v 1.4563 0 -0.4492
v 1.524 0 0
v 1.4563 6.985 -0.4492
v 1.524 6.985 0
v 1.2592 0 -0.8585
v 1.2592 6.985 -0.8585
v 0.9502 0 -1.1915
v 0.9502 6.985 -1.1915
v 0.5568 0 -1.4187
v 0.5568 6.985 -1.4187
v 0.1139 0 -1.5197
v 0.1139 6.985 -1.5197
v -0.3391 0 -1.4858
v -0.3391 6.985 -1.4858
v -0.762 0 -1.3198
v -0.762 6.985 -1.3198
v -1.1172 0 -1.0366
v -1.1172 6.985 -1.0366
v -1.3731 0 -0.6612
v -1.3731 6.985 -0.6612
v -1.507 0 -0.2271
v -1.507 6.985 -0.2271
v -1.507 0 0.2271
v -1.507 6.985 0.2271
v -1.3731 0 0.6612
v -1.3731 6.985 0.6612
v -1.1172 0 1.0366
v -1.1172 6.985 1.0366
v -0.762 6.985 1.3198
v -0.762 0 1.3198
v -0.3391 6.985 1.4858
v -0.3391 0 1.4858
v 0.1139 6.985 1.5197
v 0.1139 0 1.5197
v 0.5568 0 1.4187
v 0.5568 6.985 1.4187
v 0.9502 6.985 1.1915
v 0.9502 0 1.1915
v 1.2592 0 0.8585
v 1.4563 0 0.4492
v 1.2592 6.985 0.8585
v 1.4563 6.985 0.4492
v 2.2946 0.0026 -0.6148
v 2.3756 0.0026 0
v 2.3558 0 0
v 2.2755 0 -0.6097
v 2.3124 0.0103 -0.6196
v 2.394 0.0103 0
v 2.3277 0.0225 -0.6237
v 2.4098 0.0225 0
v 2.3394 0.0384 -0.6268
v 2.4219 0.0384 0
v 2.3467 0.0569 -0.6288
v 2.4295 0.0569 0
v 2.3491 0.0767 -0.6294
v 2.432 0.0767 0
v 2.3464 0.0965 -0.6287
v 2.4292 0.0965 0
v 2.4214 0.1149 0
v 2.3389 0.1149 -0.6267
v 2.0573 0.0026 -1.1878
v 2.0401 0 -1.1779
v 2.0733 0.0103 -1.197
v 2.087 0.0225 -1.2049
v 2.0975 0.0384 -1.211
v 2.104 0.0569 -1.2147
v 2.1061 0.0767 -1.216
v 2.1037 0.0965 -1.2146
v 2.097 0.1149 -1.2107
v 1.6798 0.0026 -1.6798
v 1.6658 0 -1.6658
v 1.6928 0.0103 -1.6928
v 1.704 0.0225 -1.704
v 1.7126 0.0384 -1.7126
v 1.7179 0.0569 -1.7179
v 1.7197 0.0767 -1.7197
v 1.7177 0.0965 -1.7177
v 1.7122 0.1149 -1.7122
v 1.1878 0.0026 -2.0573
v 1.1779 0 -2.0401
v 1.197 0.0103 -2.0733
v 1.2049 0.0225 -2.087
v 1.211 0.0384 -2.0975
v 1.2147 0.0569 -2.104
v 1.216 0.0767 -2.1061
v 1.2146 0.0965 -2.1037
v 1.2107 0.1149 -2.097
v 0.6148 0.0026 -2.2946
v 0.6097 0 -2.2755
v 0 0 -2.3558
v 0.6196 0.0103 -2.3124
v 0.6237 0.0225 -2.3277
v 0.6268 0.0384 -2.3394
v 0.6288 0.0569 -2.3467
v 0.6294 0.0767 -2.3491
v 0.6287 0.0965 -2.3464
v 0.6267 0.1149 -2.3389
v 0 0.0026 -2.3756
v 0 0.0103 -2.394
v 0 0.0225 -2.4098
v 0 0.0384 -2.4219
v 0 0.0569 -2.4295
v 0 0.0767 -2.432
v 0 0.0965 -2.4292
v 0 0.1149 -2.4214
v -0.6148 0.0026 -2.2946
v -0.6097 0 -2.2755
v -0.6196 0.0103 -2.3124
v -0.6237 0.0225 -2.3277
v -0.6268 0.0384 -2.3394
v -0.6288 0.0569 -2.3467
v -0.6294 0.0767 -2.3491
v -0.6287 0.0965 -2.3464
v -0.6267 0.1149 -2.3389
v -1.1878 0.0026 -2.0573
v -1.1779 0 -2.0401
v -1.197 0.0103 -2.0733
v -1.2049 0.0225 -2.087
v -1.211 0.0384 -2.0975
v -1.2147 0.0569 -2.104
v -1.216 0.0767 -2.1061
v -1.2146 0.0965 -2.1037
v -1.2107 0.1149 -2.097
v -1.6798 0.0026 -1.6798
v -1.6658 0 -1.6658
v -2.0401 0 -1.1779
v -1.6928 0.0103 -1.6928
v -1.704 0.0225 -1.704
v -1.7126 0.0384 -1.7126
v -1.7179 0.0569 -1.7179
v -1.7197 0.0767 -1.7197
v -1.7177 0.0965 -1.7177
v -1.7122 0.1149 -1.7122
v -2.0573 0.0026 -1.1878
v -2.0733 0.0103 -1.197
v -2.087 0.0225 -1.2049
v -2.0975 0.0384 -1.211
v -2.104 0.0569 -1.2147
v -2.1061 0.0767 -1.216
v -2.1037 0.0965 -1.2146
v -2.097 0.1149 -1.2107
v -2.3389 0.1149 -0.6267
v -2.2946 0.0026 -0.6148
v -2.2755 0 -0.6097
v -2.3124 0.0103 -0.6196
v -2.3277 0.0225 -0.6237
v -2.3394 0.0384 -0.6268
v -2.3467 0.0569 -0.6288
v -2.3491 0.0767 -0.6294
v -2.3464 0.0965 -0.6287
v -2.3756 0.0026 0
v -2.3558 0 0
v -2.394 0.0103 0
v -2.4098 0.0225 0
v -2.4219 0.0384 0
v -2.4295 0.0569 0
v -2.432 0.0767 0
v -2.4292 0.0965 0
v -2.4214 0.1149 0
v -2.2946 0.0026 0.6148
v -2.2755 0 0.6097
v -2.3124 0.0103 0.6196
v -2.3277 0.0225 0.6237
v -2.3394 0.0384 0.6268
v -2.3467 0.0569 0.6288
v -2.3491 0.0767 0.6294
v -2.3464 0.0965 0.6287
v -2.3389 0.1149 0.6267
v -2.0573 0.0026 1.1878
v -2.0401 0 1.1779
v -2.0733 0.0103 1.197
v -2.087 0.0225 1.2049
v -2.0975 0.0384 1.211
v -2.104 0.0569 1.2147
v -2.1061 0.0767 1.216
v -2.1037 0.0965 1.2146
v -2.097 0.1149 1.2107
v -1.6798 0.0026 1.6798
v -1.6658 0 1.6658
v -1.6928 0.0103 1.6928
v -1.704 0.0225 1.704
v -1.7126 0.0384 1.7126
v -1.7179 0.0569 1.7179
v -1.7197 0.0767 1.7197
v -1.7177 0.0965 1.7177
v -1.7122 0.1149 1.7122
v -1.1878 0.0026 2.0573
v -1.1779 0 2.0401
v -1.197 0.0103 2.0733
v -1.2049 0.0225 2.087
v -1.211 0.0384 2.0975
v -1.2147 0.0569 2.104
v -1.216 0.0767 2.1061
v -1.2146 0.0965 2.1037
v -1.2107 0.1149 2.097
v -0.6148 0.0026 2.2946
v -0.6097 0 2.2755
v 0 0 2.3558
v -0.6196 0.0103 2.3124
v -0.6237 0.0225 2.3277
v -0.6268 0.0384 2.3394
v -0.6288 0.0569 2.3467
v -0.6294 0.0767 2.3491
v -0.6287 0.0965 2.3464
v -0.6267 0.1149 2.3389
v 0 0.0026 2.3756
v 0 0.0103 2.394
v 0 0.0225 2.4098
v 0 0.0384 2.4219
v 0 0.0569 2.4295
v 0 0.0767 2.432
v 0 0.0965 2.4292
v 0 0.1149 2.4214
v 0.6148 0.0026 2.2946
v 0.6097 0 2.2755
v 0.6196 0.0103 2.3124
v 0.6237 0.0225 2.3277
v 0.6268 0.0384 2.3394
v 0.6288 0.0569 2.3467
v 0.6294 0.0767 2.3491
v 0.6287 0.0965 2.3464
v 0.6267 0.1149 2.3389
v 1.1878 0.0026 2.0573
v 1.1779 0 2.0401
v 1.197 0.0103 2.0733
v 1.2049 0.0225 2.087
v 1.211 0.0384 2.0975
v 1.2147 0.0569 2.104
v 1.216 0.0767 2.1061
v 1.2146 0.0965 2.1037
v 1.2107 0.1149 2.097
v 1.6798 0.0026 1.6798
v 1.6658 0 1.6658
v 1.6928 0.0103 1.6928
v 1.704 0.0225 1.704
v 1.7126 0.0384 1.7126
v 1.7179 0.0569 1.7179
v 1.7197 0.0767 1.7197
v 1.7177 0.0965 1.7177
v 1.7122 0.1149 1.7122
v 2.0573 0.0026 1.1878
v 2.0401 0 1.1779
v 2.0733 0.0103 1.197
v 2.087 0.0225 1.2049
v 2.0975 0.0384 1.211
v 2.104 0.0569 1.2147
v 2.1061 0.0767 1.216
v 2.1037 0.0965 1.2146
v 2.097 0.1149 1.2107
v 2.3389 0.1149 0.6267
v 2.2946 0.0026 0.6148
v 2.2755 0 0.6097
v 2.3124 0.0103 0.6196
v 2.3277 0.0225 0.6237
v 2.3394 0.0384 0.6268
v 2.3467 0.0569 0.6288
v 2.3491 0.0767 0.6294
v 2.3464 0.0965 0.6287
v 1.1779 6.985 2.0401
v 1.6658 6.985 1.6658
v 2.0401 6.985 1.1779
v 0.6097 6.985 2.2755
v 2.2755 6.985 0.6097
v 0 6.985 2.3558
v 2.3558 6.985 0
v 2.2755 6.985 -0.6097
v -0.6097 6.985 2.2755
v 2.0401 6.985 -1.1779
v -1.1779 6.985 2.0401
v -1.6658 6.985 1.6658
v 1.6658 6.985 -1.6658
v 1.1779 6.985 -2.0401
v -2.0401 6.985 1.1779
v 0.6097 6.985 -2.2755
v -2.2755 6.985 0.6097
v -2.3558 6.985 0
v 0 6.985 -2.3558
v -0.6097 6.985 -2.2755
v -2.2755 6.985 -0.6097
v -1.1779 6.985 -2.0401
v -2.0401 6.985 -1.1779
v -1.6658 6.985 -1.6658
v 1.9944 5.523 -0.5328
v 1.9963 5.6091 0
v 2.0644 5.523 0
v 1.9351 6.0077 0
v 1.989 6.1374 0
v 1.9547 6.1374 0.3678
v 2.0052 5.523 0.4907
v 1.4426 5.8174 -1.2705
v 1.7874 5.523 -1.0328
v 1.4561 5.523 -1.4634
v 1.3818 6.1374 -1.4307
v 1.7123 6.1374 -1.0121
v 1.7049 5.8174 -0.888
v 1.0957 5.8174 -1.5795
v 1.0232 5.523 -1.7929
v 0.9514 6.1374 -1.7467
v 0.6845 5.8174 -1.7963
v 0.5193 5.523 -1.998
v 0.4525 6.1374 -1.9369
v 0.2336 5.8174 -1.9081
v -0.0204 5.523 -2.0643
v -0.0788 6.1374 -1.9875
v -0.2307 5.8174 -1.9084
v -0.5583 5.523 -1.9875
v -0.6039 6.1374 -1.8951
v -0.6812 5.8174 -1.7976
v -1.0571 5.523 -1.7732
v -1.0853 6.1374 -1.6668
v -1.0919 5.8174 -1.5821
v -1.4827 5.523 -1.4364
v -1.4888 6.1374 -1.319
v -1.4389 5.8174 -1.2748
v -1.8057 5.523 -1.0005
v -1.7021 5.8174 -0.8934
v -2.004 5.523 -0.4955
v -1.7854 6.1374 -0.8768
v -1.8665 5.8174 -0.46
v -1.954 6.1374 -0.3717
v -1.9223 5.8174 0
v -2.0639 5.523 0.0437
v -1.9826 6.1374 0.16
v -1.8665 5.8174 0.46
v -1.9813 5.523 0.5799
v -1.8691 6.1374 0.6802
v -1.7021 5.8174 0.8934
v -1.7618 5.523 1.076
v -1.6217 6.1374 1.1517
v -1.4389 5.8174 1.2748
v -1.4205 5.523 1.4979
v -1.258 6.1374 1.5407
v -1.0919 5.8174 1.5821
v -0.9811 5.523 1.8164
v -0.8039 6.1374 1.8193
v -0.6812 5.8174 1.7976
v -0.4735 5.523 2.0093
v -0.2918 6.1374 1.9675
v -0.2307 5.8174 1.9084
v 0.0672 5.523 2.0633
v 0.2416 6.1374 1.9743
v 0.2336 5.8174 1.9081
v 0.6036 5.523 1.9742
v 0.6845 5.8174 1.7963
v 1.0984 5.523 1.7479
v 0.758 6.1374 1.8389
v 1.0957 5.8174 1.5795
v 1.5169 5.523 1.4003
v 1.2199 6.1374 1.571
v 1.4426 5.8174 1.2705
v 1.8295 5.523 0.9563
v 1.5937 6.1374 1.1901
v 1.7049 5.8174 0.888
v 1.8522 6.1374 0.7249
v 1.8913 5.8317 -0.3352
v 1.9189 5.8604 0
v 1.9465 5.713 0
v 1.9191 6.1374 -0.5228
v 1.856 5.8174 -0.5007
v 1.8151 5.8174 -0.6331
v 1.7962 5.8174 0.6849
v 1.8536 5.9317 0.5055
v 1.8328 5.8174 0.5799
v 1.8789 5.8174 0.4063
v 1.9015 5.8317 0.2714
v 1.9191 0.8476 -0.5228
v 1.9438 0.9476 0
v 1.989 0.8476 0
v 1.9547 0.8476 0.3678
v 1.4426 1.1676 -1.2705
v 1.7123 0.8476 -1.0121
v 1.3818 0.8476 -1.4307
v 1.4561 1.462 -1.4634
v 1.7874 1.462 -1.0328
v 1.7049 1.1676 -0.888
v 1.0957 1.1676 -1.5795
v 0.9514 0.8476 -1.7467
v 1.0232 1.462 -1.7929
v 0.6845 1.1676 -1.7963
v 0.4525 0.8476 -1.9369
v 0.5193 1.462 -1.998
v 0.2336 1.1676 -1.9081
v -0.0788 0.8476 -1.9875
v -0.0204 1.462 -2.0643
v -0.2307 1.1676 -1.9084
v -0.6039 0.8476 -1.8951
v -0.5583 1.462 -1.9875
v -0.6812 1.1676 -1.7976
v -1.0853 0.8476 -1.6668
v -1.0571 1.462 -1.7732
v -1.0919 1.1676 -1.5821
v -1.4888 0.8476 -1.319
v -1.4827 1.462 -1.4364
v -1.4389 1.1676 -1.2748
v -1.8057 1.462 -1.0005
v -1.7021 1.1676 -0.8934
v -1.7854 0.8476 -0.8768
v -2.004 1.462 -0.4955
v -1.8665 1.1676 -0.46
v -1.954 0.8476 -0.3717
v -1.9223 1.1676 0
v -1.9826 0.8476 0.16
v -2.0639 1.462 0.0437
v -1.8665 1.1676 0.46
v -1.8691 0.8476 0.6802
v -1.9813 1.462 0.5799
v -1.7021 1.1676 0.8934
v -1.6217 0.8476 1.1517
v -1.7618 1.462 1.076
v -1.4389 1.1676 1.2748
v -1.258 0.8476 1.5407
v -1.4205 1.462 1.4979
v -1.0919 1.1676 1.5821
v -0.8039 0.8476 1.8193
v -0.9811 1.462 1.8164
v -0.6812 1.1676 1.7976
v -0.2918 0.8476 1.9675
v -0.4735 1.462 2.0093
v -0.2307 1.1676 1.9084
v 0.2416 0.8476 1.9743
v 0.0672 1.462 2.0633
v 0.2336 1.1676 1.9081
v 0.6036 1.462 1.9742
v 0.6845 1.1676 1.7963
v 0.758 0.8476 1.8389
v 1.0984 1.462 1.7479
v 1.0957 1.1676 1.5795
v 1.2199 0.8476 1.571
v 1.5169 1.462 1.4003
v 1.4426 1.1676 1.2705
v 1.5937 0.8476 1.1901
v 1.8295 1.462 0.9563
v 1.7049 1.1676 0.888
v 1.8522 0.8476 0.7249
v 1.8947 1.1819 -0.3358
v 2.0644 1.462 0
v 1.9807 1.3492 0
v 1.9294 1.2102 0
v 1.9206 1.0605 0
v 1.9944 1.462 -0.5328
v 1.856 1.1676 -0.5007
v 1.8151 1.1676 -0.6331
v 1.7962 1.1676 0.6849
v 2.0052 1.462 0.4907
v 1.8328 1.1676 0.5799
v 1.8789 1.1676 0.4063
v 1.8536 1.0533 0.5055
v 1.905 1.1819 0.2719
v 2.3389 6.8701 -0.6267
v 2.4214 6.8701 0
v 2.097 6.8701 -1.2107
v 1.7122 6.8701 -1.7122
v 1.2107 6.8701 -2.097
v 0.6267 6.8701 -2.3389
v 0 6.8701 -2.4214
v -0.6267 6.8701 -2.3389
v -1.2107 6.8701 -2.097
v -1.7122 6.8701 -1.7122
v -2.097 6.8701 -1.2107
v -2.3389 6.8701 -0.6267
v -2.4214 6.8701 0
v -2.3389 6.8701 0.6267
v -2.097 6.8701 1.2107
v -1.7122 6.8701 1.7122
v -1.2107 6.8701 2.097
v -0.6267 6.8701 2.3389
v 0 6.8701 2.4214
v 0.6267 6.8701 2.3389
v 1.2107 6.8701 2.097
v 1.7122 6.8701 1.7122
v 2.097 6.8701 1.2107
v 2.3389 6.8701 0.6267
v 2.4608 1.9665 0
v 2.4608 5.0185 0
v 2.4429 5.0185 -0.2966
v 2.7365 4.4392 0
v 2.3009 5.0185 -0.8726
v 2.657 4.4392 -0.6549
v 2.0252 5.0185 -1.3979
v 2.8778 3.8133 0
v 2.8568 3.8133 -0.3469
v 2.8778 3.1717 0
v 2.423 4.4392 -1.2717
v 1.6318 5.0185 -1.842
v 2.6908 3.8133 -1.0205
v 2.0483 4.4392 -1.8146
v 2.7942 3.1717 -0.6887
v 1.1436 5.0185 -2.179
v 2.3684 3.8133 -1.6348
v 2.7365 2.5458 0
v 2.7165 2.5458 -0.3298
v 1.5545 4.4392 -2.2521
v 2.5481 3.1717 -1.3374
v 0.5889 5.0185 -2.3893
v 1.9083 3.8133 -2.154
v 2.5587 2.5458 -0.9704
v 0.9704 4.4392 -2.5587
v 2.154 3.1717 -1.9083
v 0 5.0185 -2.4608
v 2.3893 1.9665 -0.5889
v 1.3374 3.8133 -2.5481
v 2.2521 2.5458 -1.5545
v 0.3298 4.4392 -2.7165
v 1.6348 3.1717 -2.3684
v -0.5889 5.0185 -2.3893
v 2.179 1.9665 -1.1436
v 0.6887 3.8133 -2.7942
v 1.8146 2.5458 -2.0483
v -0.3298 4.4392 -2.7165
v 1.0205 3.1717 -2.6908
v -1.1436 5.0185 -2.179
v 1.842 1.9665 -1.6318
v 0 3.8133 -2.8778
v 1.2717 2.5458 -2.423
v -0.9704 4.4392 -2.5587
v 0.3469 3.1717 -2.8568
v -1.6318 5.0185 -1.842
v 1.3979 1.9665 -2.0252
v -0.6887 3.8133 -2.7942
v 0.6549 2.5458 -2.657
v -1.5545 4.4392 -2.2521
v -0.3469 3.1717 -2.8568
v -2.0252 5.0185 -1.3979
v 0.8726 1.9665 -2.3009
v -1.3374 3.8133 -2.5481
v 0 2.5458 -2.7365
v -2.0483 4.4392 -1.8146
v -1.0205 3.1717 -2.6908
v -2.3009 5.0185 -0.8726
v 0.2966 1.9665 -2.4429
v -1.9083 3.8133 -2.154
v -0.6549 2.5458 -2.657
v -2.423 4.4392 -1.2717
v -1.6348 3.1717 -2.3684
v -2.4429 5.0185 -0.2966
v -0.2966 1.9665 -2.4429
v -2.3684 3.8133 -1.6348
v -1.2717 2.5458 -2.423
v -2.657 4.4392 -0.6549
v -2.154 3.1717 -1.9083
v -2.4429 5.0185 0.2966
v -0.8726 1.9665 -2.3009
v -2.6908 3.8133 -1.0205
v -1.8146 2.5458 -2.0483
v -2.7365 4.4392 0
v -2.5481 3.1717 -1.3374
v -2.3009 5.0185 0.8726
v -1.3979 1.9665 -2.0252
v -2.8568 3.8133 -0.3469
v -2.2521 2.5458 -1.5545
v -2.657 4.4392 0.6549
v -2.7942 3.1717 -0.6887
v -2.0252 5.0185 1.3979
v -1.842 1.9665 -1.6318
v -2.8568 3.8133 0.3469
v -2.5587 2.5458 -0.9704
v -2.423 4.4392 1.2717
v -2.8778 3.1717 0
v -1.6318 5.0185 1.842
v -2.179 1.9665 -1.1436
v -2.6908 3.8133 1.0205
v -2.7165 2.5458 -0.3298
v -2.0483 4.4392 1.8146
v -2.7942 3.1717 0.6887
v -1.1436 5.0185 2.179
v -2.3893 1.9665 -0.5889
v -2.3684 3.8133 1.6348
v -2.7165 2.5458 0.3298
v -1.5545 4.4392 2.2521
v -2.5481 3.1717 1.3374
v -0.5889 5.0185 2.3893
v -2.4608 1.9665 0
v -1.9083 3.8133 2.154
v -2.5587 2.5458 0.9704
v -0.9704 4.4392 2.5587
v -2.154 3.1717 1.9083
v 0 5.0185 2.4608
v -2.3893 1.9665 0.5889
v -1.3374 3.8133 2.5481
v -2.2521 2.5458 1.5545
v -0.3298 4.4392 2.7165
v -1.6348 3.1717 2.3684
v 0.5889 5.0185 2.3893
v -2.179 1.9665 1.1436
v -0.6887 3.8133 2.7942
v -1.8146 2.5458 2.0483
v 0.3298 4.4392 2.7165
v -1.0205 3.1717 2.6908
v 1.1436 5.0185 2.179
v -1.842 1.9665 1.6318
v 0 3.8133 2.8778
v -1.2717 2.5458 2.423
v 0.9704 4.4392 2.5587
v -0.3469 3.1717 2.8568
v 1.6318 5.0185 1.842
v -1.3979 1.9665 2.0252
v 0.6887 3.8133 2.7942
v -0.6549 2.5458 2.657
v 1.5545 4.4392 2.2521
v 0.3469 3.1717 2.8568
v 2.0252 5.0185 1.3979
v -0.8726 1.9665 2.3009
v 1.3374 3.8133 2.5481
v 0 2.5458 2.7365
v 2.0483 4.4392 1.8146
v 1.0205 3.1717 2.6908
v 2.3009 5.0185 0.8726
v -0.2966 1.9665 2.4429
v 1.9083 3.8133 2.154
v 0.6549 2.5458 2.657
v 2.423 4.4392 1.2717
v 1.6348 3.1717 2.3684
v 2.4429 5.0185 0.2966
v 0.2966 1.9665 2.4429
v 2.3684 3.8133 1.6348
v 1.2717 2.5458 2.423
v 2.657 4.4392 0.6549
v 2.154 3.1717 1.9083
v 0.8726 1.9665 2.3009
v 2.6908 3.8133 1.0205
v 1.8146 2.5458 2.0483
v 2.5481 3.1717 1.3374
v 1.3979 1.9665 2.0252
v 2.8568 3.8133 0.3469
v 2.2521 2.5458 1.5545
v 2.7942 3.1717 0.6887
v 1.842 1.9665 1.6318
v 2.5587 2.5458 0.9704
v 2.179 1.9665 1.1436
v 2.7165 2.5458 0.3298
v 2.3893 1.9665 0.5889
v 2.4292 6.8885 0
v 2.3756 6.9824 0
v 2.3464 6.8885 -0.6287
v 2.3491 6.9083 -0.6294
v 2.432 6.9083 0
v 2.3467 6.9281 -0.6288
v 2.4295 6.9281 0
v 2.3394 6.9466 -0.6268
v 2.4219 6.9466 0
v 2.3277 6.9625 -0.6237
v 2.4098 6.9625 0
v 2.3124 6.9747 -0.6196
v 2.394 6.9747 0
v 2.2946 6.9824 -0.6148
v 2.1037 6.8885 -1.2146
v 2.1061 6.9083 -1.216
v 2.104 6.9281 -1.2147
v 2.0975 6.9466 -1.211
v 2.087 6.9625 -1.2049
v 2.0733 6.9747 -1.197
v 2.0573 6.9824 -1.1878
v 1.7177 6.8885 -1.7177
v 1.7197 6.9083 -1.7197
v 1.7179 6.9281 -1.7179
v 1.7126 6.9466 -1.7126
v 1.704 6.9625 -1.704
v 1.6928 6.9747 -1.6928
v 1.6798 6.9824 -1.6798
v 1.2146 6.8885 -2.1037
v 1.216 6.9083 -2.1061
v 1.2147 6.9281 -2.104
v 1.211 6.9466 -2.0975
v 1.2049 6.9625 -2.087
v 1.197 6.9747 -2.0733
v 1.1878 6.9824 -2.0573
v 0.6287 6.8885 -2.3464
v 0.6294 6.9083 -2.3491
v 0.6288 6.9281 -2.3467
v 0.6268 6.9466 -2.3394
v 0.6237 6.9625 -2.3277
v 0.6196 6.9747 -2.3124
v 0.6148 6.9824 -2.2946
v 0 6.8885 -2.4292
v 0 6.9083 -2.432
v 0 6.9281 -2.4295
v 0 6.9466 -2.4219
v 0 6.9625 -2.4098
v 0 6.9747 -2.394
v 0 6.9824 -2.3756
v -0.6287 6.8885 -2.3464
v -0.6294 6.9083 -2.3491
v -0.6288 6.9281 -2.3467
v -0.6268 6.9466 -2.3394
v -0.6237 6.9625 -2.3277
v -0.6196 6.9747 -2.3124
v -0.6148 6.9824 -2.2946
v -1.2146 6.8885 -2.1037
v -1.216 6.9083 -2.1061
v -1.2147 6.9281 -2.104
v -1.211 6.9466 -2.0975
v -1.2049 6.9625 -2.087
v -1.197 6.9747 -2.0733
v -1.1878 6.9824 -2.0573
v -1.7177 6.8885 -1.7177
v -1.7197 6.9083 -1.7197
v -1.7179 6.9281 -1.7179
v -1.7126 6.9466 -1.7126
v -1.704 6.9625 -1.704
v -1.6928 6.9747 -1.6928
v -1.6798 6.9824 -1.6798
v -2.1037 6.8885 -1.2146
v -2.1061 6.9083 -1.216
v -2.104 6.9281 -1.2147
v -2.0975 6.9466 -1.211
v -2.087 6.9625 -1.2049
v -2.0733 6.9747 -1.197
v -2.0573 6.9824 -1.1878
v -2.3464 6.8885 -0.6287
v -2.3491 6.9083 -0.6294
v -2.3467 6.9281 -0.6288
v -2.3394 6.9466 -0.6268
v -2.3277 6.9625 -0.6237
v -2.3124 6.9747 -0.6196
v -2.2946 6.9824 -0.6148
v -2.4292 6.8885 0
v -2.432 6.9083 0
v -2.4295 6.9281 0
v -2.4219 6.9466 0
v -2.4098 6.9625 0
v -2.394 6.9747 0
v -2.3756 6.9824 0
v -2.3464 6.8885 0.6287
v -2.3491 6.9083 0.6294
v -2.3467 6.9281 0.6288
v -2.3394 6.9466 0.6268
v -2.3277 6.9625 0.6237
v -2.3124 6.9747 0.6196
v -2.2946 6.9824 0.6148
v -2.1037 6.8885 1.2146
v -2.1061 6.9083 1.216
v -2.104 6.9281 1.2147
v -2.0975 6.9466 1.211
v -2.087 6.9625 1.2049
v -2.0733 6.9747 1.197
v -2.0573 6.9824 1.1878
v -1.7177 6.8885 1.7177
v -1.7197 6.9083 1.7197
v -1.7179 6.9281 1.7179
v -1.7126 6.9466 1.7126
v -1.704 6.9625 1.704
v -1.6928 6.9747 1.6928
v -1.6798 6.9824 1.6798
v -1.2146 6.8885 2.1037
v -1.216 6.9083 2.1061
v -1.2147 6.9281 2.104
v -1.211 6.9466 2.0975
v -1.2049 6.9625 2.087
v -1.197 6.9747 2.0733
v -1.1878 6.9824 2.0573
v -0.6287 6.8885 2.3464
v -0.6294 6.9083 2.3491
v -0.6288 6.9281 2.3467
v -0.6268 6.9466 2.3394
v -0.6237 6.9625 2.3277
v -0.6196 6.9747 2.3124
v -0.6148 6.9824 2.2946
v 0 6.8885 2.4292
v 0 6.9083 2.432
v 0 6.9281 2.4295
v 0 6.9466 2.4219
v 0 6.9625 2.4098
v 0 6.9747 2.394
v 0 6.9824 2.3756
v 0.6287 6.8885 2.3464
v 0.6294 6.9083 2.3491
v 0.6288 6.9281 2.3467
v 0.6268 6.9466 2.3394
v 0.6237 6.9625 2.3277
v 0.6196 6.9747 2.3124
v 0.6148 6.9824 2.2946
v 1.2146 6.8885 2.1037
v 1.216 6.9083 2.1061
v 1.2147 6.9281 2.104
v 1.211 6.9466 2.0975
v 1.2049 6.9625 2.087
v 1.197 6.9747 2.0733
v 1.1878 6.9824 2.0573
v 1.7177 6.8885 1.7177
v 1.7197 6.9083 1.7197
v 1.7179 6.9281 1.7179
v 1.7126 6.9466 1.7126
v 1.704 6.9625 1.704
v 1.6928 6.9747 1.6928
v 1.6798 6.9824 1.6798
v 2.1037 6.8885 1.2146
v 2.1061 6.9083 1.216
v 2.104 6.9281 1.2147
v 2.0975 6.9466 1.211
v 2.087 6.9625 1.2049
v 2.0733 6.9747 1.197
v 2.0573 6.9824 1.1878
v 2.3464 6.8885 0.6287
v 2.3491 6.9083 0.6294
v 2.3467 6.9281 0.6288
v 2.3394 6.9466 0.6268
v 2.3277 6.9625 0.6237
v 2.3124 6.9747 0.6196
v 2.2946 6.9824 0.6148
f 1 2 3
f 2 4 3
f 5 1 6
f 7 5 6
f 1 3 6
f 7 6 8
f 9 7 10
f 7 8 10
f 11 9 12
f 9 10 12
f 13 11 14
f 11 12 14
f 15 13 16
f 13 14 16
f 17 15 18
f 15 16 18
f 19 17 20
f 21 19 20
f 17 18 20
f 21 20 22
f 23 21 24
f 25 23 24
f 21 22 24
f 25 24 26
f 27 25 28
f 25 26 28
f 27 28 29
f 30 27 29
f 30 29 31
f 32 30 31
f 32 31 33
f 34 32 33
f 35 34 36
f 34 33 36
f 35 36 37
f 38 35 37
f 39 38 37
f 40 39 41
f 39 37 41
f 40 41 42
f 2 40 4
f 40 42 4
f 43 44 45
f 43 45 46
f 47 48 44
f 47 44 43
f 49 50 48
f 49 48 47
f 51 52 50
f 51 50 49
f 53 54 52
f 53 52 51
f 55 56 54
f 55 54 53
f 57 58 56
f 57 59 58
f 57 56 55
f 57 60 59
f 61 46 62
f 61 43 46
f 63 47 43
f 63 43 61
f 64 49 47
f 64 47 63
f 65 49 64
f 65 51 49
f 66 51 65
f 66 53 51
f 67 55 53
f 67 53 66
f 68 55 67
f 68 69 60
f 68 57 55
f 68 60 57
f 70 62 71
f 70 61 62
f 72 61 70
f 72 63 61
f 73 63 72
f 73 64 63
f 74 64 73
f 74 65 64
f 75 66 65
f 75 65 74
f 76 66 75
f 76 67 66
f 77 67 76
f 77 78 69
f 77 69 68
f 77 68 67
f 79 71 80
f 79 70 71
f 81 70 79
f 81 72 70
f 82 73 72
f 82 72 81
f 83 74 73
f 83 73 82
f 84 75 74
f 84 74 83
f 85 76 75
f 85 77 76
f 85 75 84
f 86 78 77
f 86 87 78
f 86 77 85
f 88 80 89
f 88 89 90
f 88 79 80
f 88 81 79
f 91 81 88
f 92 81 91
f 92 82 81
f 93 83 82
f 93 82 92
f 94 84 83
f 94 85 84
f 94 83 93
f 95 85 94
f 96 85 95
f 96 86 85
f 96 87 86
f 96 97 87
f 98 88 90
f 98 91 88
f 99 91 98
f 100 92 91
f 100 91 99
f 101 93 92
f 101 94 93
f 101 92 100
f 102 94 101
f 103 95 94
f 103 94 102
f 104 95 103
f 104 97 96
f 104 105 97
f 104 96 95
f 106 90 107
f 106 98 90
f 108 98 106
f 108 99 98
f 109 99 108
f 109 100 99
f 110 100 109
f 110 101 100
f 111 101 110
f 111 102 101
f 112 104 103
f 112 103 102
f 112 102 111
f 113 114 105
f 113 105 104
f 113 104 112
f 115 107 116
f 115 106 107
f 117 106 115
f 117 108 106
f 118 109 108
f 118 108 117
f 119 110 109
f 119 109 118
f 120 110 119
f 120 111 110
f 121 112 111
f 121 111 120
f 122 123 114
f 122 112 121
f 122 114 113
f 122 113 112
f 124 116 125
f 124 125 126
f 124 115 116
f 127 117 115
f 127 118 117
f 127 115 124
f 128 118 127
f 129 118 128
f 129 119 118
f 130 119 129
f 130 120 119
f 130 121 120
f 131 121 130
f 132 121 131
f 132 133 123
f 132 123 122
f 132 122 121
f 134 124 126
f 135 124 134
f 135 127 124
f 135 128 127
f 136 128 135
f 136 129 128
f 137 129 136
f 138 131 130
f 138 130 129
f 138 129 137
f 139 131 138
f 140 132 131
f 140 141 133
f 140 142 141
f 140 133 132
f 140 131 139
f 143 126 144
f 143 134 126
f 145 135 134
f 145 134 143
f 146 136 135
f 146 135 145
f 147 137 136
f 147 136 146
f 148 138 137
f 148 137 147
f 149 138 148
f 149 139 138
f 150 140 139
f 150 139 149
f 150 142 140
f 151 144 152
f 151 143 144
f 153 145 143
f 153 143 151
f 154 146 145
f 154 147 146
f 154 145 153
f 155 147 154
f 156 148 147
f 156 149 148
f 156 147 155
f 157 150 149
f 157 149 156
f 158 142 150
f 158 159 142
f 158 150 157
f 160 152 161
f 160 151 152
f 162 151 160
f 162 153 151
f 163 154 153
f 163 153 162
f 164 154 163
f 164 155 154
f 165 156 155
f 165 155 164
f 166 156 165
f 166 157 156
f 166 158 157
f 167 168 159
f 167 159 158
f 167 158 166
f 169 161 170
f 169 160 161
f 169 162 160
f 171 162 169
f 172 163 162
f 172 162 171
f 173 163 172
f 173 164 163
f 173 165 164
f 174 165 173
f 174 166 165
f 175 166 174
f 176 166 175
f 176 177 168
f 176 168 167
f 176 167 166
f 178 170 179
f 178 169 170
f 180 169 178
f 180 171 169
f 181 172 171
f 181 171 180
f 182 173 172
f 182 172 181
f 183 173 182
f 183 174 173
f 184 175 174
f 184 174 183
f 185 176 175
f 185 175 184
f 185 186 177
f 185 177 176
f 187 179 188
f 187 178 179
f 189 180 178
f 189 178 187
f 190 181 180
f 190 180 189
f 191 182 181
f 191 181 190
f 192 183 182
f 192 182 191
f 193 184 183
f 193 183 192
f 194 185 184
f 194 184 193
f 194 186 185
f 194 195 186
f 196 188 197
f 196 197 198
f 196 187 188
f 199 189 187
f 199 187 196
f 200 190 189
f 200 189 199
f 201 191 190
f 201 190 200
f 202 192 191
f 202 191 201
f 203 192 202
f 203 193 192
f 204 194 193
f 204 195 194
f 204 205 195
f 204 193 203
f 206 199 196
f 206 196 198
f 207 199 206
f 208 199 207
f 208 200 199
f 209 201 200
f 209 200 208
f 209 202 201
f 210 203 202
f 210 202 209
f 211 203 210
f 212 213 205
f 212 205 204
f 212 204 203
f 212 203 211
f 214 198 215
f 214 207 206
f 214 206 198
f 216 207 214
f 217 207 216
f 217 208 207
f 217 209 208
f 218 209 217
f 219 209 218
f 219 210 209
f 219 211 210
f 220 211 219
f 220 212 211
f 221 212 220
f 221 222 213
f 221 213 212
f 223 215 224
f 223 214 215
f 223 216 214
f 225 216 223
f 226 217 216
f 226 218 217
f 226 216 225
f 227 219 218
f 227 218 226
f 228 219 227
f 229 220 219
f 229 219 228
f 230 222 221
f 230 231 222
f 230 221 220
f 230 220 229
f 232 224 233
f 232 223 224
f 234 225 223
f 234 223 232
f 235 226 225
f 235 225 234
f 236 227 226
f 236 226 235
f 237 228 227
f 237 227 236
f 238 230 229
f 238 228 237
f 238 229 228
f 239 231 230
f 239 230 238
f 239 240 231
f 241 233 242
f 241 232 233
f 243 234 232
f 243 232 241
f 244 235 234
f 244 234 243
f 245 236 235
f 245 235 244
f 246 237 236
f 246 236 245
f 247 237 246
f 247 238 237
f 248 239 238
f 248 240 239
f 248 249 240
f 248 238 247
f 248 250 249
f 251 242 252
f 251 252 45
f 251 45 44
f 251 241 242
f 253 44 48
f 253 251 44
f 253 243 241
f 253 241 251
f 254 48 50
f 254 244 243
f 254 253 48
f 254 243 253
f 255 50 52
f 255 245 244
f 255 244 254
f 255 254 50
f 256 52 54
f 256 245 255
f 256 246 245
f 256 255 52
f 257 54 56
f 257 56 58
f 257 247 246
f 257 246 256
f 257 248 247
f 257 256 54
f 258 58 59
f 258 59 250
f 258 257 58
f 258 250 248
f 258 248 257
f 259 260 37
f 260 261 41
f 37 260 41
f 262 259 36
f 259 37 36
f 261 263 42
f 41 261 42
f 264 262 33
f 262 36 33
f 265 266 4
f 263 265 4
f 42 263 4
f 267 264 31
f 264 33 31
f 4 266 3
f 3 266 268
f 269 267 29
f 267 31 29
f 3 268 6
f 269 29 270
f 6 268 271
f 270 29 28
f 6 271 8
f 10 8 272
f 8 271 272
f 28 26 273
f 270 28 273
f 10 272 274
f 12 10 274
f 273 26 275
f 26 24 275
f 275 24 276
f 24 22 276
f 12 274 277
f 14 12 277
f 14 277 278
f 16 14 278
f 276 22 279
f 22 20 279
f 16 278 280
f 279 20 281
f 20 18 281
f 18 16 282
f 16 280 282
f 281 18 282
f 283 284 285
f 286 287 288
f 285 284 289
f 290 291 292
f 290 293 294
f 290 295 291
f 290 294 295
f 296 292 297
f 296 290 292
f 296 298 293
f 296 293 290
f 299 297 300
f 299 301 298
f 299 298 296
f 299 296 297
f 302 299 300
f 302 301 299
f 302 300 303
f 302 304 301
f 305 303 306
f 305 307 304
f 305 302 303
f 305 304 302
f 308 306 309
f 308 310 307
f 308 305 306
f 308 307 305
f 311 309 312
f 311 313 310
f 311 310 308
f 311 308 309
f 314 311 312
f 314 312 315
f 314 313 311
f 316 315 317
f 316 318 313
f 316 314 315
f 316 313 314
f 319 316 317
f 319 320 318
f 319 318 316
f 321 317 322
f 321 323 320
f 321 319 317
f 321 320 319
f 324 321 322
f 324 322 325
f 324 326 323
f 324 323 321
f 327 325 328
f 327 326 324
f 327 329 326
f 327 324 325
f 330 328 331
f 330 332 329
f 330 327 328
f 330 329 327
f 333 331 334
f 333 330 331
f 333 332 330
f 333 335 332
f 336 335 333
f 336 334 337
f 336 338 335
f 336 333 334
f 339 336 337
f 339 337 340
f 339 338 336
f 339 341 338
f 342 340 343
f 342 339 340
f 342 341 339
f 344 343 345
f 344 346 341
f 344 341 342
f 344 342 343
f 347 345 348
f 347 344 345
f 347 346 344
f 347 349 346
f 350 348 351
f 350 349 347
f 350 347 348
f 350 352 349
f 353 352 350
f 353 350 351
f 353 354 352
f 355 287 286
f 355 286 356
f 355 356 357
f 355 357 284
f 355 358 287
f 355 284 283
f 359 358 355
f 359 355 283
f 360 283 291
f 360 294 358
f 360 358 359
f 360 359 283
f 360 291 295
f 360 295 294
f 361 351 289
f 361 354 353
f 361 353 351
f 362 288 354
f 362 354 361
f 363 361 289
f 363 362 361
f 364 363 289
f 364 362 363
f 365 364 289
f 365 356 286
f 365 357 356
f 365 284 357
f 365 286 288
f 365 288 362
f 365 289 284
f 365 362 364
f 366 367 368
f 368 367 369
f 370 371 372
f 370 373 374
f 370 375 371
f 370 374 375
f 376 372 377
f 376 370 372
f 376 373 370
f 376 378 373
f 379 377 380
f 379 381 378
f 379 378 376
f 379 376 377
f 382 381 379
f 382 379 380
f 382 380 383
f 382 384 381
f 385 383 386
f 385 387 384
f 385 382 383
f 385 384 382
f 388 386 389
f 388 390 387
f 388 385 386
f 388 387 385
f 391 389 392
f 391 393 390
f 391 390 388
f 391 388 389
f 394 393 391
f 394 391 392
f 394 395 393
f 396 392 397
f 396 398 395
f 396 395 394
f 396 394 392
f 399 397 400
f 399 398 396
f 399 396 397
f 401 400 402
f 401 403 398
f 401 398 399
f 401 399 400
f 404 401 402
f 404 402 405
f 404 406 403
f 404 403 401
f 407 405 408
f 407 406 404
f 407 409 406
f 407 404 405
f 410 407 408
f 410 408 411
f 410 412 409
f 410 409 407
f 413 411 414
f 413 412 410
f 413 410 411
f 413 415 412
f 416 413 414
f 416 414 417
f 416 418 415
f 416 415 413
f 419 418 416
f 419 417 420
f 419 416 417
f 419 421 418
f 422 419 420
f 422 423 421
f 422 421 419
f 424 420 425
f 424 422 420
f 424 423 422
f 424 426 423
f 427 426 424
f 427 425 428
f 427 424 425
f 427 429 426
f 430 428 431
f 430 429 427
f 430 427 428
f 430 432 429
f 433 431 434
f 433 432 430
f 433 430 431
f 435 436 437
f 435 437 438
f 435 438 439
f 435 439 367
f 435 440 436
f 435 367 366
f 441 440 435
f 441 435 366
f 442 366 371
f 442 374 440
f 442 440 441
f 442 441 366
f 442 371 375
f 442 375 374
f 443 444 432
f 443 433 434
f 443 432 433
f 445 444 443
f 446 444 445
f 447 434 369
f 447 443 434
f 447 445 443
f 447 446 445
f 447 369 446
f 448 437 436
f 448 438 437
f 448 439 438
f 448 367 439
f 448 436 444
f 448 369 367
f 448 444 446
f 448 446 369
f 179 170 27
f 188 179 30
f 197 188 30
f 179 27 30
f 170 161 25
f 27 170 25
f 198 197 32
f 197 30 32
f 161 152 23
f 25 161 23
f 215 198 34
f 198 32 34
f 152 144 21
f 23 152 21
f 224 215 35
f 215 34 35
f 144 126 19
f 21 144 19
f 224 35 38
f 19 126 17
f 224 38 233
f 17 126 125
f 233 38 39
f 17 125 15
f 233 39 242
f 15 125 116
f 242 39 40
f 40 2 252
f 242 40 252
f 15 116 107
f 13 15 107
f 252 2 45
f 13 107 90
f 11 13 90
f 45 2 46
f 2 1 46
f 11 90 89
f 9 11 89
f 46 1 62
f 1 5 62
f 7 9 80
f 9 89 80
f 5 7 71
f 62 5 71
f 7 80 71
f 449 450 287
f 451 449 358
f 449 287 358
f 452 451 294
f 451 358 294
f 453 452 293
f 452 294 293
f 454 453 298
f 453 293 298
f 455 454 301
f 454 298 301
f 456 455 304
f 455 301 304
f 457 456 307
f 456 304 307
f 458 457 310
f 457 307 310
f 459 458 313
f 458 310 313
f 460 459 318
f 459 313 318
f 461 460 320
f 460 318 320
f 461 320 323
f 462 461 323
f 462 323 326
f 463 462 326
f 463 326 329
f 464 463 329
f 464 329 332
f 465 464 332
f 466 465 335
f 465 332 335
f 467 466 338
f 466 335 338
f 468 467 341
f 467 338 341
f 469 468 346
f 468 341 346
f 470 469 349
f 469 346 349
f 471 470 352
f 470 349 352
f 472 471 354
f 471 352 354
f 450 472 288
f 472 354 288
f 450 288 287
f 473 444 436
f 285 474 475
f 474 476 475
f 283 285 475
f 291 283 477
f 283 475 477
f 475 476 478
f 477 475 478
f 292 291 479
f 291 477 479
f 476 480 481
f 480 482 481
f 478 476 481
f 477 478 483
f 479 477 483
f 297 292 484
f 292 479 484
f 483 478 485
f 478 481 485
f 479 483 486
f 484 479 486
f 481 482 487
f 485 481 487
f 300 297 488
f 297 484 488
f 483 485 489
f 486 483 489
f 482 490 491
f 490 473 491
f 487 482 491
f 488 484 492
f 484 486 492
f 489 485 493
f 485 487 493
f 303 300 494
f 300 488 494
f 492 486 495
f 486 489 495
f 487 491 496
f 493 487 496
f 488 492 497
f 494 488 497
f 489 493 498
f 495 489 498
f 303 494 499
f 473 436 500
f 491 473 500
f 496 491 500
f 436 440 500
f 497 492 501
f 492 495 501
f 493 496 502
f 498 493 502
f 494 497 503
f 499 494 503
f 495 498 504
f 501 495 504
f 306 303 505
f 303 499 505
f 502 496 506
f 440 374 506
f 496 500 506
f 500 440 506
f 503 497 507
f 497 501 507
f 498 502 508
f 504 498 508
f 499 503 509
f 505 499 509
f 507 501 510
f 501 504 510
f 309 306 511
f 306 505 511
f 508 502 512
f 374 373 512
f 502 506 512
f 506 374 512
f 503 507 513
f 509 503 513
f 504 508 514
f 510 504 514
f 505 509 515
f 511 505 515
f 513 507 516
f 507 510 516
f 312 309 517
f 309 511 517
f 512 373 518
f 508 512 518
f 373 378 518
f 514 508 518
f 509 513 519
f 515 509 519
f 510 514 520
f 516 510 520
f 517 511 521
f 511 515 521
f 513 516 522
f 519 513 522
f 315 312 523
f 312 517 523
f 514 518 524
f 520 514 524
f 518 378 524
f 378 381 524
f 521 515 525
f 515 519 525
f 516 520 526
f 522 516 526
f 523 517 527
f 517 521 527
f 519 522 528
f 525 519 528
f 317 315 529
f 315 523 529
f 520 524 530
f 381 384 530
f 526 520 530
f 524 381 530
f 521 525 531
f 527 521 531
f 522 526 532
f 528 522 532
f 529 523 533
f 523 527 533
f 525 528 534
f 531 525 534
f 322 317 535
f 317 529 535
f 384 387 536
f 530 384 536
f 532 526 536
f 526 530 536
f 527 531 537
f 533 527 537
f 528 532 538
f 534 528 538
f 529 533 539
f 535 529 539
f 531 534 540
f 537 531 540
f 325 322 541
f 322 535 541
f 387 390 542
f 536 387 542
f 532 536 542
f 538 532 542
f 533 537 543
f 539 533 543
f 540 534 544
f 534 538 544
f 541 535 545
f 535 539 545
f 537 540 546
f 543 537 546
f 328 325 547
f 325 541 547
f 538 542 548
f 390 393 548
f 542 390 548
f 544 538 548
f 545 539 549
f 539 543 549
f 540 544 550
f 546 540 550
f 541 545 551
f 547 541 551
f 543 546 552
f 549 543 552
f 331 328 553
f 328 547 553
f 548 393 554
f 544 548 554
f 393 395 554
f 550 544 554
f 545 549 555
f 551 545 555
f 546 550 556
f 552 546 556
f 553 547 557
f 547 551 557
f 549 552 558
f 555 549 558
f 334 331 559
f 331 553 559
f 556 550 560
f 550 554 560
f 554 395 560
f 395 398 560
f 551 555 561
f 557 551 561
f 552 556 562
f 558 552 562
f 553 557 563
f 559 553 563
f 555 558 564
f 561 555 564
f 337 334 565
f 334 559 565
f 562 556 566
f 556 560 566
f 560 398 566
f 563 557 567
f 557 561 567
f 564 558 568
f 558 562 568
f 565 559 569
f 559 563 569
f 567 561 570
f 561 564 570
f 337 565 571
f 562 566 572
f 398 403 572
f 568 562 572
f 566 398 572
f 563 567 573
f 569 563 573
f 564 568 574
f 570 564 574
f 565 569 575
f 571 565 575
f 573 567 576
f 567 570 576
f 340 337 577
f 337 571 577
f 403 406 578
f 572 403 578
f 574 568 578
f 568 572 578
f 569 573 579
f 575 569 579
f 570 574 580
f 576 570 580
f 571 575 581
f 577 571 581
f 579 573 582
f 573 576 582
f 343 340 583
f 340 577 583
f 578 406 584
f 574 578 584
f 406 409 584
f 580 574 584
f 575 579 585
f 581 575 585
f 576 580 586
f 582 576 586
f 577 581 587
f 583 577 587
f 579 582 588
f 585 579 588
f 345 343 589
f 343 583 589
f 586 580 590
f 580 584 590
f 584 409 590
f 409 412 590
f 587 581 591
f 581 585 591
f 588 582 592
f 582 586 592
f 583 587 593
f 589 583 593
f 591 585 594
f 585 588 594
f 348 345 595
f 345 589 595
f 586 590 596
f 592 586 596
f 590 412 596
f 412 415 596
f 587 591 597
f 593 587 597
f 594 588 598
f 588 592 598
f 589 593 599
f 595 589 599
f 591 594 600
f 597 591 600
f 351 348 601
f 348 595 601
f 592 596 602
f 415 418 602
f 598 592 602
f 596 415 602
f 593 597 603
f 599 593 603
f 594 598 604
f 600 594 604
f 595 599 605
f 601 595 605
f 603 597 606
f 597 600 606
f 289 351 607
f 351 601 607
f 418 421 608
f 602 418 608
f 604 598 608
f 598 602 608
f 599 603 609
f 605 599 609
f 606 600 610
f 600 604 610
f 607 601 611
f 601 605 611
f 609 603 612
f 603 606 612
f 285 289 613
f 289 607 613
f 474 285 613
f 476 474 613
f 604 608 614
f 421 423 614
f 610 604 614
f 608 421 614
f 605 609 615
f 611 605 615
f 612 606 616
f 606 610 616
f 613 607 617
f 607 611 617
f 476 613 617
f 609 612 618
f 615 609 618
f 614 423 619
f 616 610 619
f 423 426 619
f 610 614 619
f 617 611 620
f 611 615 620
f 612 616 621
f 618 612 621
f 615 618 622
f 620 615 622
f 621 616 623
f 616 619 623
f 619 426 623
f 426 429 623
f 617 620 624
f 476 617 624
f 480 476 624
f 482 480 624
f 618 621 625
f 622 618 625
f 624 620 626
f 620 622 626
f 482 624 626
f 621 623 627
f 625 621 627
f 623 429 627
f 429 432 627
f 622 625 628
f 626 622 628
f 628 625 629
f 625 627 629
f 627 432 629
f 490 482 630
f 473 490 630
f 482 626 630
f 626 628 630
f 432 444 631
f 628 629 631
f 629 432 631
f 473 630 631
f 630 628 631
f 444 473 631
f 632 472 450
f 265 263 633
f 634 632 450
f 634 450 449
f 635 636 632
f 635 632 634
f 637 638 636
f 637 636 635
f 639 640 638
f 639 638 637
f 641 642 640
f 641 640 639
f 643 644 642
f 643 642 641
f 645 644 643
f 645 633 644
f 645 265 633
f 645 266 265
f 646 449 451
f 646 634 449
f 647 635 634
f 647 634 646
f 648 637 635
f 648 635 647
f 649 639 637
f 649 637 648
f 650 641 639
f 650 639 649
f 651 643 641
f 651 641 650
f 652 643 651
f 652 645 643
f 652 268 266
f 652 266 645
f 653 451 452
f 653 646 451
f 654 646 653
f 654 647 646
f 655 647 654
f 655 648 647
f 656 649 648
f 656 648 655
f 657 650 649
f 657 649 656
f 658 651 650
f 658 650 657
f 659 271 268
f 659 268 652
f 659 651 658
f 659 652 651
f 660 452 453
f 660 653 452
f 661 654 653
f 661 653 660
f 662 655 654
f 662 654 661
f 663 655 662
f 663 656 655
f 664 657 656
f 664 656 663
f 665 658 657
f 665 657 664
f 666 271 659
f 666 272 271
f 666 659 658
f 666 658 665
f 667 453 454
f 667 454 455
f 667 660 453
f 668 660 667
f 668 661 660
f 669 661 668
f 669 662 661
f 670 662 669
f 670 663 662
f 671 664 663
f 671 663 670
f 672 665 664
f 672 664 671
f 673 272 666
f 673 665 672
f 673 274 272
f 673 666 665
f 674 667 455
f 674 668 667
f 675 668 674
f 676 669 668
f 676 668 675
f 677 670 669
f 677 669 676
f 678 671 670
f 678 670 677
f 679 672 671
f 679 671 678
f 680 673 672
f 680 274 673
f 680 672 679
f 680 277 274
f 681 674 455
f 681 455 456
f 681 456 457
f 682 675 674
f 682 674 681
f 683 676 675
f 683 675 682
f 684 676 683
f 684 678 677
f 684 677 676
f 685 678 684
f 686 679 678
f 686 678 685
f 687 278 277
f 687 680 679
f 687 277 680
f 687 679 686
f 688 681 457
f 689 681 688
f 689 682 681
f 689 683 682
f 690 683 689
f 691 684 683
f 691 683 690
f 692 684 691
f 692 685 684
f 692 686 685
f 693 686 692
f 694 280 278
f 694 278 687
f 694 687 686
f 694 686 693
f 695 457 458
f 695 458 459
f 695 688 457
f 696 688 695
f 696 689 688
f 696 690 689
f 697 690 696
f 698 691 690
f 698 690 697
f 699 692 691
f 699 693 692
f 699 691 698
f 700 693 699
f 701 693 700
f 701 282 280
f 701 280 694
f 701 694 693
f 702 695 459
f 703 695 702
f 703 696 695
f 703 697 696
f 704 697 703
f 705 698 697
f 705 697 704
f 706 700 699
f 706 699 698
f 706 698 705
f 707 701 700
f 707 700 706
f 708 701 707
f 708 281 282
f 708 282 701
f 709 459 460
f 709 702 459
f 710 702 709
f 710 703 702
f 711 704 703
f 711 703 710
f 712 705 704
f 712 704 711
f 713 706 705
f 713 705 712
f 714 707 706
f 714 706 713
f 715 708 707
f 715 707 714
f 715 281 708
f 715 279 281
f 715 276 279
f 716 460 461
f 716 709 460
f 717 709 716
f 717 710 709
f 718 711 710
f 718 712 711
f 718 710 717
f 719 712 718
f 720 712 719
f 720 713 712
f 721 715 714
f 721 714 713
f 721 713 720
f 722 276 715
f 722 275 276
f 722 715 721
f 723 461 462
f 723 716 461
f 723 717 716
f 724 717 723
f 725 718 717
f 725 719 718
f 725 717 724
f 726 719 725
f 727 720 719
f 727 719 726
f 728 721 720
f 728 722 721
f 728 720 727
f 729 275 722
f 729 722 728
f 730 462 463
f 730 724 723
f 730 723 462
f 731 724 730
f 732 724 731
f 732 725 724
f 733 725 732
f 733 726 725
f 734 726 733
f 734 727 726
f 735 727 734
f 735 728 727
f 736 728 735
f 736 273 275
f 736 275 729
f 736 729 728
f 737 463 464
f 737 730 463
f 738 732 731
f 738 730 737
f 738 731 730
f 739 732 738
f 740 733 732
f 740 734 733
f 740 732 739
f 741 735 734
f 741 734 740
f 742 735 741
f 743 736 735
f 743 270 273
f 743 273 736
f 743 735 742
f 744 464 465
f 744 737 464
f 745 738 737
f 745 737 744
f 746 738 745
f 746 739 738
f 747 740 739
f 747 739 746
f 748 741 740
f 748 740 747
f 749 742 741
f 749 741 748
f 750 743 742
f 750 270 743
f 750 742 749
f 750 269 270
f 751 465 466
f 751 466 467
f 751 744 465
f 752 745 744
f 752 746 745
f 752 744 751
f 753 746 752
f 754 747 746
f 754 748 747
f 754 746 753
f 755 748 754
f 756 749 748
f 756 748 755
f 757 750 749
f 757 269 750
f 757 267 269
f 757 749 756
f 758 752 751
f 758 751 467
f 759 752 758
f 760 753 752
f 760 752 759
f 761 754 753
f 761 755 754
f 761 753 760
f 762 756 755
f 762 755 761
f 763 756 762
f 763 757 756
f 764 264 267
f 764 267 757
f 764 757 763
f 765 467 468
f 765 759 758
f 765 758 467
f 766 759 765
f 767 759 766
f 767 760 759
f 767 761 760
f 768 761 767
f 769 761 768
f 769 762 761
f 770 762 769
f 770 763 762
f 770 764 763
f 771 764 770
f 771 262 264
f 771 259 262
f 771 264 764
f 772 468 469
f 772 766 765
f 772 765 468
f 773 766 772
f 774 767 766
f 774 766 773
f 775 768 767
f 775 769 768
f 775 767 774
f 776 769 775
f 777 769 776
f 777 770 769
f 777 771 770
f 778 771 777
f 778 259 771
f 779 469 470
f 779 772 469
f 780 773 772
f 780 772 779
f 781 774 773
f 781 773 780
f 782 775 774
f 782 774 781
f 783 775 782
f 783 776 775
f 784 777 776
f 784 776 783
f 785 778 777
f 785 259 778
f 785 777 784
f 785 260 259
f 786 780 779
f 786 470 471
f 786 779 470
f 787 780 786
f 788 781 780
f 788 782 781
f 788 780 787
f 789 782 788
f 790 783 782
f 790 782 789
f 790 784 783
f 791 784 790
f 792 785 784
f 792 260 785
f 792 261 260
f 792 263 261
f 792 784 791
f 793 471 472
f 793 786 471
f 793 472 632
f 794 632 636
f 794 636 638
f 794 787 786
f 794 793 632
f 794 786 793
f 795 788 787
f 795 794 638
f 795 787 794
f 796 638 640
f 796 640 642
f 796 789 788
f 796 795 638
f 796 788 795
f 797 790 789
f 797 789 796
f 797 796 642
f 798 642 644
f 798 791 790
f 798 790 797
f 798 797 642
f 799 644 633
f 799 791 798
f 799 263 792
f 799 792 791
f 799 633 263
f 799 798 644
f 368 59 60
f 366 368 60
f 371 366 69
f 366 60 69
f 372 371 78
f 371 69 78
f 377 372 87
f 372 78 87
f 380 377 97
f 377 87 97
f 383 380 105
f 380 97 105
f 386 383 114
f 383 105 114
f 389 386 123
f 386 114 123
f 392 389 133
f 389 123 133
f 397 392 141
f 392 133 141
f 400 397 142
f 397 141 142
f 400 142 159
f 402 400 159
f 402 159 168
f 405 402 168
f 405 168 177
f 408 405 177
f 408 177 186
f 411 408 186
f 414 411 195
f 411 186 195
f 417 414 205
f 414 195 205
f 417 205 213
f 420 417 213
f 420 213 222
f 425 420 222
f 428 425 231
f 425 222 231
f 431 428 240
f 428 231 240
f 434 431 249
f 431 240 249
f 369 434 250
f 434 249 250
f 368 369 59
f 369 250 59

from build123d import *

# Parameters (mm, degrees)
FILLET1_R = 0.508
FILLET2_R = 0.0762


with BuildPart() as part:
    # Sketch1 → Revolve1 (revolve)
    with BuildSketch(Plane.XY):
        with BuildLine():
            Line((1.524, 0), (1.524, 6.985))
            Line((1.524, 6.985), (2.4892, 6.985))
            Line((2.4892, 6.985), (1.777274138, 5.7785))
            ThreePointArc((1.777274138, 5.7785), (2.8956, 3.4925), (1.777274138, 1.2065))
            Line((1.777274138, 1.2065), (2.4892, 0))
            Line((2.4892, 0), (1.524, 0))
        make_face()
    revolve(axis=Axis((0, 0, 0), (0, 1, 0)))

    # Fillet1
    fillet1_edges = [part.edges().sort_by_distance(p)[0] for p in [
        (-1.777274138, 1.2065, 0),
        (-1.777274138, 5.7785, 0),
    ]]
    fillet(fillet1_edges, radius=FILLET1_R)

    # Fillet2
    fillet2_edges = [part.edges().sort_by_distance(p)[0] for p in [
        (-2.4892, 0, 0),
        (-2.4892, 6.985, 0),
    ]]
    fillet(fillet2_edges, radius=FILLET2_R)


solid = part.part
